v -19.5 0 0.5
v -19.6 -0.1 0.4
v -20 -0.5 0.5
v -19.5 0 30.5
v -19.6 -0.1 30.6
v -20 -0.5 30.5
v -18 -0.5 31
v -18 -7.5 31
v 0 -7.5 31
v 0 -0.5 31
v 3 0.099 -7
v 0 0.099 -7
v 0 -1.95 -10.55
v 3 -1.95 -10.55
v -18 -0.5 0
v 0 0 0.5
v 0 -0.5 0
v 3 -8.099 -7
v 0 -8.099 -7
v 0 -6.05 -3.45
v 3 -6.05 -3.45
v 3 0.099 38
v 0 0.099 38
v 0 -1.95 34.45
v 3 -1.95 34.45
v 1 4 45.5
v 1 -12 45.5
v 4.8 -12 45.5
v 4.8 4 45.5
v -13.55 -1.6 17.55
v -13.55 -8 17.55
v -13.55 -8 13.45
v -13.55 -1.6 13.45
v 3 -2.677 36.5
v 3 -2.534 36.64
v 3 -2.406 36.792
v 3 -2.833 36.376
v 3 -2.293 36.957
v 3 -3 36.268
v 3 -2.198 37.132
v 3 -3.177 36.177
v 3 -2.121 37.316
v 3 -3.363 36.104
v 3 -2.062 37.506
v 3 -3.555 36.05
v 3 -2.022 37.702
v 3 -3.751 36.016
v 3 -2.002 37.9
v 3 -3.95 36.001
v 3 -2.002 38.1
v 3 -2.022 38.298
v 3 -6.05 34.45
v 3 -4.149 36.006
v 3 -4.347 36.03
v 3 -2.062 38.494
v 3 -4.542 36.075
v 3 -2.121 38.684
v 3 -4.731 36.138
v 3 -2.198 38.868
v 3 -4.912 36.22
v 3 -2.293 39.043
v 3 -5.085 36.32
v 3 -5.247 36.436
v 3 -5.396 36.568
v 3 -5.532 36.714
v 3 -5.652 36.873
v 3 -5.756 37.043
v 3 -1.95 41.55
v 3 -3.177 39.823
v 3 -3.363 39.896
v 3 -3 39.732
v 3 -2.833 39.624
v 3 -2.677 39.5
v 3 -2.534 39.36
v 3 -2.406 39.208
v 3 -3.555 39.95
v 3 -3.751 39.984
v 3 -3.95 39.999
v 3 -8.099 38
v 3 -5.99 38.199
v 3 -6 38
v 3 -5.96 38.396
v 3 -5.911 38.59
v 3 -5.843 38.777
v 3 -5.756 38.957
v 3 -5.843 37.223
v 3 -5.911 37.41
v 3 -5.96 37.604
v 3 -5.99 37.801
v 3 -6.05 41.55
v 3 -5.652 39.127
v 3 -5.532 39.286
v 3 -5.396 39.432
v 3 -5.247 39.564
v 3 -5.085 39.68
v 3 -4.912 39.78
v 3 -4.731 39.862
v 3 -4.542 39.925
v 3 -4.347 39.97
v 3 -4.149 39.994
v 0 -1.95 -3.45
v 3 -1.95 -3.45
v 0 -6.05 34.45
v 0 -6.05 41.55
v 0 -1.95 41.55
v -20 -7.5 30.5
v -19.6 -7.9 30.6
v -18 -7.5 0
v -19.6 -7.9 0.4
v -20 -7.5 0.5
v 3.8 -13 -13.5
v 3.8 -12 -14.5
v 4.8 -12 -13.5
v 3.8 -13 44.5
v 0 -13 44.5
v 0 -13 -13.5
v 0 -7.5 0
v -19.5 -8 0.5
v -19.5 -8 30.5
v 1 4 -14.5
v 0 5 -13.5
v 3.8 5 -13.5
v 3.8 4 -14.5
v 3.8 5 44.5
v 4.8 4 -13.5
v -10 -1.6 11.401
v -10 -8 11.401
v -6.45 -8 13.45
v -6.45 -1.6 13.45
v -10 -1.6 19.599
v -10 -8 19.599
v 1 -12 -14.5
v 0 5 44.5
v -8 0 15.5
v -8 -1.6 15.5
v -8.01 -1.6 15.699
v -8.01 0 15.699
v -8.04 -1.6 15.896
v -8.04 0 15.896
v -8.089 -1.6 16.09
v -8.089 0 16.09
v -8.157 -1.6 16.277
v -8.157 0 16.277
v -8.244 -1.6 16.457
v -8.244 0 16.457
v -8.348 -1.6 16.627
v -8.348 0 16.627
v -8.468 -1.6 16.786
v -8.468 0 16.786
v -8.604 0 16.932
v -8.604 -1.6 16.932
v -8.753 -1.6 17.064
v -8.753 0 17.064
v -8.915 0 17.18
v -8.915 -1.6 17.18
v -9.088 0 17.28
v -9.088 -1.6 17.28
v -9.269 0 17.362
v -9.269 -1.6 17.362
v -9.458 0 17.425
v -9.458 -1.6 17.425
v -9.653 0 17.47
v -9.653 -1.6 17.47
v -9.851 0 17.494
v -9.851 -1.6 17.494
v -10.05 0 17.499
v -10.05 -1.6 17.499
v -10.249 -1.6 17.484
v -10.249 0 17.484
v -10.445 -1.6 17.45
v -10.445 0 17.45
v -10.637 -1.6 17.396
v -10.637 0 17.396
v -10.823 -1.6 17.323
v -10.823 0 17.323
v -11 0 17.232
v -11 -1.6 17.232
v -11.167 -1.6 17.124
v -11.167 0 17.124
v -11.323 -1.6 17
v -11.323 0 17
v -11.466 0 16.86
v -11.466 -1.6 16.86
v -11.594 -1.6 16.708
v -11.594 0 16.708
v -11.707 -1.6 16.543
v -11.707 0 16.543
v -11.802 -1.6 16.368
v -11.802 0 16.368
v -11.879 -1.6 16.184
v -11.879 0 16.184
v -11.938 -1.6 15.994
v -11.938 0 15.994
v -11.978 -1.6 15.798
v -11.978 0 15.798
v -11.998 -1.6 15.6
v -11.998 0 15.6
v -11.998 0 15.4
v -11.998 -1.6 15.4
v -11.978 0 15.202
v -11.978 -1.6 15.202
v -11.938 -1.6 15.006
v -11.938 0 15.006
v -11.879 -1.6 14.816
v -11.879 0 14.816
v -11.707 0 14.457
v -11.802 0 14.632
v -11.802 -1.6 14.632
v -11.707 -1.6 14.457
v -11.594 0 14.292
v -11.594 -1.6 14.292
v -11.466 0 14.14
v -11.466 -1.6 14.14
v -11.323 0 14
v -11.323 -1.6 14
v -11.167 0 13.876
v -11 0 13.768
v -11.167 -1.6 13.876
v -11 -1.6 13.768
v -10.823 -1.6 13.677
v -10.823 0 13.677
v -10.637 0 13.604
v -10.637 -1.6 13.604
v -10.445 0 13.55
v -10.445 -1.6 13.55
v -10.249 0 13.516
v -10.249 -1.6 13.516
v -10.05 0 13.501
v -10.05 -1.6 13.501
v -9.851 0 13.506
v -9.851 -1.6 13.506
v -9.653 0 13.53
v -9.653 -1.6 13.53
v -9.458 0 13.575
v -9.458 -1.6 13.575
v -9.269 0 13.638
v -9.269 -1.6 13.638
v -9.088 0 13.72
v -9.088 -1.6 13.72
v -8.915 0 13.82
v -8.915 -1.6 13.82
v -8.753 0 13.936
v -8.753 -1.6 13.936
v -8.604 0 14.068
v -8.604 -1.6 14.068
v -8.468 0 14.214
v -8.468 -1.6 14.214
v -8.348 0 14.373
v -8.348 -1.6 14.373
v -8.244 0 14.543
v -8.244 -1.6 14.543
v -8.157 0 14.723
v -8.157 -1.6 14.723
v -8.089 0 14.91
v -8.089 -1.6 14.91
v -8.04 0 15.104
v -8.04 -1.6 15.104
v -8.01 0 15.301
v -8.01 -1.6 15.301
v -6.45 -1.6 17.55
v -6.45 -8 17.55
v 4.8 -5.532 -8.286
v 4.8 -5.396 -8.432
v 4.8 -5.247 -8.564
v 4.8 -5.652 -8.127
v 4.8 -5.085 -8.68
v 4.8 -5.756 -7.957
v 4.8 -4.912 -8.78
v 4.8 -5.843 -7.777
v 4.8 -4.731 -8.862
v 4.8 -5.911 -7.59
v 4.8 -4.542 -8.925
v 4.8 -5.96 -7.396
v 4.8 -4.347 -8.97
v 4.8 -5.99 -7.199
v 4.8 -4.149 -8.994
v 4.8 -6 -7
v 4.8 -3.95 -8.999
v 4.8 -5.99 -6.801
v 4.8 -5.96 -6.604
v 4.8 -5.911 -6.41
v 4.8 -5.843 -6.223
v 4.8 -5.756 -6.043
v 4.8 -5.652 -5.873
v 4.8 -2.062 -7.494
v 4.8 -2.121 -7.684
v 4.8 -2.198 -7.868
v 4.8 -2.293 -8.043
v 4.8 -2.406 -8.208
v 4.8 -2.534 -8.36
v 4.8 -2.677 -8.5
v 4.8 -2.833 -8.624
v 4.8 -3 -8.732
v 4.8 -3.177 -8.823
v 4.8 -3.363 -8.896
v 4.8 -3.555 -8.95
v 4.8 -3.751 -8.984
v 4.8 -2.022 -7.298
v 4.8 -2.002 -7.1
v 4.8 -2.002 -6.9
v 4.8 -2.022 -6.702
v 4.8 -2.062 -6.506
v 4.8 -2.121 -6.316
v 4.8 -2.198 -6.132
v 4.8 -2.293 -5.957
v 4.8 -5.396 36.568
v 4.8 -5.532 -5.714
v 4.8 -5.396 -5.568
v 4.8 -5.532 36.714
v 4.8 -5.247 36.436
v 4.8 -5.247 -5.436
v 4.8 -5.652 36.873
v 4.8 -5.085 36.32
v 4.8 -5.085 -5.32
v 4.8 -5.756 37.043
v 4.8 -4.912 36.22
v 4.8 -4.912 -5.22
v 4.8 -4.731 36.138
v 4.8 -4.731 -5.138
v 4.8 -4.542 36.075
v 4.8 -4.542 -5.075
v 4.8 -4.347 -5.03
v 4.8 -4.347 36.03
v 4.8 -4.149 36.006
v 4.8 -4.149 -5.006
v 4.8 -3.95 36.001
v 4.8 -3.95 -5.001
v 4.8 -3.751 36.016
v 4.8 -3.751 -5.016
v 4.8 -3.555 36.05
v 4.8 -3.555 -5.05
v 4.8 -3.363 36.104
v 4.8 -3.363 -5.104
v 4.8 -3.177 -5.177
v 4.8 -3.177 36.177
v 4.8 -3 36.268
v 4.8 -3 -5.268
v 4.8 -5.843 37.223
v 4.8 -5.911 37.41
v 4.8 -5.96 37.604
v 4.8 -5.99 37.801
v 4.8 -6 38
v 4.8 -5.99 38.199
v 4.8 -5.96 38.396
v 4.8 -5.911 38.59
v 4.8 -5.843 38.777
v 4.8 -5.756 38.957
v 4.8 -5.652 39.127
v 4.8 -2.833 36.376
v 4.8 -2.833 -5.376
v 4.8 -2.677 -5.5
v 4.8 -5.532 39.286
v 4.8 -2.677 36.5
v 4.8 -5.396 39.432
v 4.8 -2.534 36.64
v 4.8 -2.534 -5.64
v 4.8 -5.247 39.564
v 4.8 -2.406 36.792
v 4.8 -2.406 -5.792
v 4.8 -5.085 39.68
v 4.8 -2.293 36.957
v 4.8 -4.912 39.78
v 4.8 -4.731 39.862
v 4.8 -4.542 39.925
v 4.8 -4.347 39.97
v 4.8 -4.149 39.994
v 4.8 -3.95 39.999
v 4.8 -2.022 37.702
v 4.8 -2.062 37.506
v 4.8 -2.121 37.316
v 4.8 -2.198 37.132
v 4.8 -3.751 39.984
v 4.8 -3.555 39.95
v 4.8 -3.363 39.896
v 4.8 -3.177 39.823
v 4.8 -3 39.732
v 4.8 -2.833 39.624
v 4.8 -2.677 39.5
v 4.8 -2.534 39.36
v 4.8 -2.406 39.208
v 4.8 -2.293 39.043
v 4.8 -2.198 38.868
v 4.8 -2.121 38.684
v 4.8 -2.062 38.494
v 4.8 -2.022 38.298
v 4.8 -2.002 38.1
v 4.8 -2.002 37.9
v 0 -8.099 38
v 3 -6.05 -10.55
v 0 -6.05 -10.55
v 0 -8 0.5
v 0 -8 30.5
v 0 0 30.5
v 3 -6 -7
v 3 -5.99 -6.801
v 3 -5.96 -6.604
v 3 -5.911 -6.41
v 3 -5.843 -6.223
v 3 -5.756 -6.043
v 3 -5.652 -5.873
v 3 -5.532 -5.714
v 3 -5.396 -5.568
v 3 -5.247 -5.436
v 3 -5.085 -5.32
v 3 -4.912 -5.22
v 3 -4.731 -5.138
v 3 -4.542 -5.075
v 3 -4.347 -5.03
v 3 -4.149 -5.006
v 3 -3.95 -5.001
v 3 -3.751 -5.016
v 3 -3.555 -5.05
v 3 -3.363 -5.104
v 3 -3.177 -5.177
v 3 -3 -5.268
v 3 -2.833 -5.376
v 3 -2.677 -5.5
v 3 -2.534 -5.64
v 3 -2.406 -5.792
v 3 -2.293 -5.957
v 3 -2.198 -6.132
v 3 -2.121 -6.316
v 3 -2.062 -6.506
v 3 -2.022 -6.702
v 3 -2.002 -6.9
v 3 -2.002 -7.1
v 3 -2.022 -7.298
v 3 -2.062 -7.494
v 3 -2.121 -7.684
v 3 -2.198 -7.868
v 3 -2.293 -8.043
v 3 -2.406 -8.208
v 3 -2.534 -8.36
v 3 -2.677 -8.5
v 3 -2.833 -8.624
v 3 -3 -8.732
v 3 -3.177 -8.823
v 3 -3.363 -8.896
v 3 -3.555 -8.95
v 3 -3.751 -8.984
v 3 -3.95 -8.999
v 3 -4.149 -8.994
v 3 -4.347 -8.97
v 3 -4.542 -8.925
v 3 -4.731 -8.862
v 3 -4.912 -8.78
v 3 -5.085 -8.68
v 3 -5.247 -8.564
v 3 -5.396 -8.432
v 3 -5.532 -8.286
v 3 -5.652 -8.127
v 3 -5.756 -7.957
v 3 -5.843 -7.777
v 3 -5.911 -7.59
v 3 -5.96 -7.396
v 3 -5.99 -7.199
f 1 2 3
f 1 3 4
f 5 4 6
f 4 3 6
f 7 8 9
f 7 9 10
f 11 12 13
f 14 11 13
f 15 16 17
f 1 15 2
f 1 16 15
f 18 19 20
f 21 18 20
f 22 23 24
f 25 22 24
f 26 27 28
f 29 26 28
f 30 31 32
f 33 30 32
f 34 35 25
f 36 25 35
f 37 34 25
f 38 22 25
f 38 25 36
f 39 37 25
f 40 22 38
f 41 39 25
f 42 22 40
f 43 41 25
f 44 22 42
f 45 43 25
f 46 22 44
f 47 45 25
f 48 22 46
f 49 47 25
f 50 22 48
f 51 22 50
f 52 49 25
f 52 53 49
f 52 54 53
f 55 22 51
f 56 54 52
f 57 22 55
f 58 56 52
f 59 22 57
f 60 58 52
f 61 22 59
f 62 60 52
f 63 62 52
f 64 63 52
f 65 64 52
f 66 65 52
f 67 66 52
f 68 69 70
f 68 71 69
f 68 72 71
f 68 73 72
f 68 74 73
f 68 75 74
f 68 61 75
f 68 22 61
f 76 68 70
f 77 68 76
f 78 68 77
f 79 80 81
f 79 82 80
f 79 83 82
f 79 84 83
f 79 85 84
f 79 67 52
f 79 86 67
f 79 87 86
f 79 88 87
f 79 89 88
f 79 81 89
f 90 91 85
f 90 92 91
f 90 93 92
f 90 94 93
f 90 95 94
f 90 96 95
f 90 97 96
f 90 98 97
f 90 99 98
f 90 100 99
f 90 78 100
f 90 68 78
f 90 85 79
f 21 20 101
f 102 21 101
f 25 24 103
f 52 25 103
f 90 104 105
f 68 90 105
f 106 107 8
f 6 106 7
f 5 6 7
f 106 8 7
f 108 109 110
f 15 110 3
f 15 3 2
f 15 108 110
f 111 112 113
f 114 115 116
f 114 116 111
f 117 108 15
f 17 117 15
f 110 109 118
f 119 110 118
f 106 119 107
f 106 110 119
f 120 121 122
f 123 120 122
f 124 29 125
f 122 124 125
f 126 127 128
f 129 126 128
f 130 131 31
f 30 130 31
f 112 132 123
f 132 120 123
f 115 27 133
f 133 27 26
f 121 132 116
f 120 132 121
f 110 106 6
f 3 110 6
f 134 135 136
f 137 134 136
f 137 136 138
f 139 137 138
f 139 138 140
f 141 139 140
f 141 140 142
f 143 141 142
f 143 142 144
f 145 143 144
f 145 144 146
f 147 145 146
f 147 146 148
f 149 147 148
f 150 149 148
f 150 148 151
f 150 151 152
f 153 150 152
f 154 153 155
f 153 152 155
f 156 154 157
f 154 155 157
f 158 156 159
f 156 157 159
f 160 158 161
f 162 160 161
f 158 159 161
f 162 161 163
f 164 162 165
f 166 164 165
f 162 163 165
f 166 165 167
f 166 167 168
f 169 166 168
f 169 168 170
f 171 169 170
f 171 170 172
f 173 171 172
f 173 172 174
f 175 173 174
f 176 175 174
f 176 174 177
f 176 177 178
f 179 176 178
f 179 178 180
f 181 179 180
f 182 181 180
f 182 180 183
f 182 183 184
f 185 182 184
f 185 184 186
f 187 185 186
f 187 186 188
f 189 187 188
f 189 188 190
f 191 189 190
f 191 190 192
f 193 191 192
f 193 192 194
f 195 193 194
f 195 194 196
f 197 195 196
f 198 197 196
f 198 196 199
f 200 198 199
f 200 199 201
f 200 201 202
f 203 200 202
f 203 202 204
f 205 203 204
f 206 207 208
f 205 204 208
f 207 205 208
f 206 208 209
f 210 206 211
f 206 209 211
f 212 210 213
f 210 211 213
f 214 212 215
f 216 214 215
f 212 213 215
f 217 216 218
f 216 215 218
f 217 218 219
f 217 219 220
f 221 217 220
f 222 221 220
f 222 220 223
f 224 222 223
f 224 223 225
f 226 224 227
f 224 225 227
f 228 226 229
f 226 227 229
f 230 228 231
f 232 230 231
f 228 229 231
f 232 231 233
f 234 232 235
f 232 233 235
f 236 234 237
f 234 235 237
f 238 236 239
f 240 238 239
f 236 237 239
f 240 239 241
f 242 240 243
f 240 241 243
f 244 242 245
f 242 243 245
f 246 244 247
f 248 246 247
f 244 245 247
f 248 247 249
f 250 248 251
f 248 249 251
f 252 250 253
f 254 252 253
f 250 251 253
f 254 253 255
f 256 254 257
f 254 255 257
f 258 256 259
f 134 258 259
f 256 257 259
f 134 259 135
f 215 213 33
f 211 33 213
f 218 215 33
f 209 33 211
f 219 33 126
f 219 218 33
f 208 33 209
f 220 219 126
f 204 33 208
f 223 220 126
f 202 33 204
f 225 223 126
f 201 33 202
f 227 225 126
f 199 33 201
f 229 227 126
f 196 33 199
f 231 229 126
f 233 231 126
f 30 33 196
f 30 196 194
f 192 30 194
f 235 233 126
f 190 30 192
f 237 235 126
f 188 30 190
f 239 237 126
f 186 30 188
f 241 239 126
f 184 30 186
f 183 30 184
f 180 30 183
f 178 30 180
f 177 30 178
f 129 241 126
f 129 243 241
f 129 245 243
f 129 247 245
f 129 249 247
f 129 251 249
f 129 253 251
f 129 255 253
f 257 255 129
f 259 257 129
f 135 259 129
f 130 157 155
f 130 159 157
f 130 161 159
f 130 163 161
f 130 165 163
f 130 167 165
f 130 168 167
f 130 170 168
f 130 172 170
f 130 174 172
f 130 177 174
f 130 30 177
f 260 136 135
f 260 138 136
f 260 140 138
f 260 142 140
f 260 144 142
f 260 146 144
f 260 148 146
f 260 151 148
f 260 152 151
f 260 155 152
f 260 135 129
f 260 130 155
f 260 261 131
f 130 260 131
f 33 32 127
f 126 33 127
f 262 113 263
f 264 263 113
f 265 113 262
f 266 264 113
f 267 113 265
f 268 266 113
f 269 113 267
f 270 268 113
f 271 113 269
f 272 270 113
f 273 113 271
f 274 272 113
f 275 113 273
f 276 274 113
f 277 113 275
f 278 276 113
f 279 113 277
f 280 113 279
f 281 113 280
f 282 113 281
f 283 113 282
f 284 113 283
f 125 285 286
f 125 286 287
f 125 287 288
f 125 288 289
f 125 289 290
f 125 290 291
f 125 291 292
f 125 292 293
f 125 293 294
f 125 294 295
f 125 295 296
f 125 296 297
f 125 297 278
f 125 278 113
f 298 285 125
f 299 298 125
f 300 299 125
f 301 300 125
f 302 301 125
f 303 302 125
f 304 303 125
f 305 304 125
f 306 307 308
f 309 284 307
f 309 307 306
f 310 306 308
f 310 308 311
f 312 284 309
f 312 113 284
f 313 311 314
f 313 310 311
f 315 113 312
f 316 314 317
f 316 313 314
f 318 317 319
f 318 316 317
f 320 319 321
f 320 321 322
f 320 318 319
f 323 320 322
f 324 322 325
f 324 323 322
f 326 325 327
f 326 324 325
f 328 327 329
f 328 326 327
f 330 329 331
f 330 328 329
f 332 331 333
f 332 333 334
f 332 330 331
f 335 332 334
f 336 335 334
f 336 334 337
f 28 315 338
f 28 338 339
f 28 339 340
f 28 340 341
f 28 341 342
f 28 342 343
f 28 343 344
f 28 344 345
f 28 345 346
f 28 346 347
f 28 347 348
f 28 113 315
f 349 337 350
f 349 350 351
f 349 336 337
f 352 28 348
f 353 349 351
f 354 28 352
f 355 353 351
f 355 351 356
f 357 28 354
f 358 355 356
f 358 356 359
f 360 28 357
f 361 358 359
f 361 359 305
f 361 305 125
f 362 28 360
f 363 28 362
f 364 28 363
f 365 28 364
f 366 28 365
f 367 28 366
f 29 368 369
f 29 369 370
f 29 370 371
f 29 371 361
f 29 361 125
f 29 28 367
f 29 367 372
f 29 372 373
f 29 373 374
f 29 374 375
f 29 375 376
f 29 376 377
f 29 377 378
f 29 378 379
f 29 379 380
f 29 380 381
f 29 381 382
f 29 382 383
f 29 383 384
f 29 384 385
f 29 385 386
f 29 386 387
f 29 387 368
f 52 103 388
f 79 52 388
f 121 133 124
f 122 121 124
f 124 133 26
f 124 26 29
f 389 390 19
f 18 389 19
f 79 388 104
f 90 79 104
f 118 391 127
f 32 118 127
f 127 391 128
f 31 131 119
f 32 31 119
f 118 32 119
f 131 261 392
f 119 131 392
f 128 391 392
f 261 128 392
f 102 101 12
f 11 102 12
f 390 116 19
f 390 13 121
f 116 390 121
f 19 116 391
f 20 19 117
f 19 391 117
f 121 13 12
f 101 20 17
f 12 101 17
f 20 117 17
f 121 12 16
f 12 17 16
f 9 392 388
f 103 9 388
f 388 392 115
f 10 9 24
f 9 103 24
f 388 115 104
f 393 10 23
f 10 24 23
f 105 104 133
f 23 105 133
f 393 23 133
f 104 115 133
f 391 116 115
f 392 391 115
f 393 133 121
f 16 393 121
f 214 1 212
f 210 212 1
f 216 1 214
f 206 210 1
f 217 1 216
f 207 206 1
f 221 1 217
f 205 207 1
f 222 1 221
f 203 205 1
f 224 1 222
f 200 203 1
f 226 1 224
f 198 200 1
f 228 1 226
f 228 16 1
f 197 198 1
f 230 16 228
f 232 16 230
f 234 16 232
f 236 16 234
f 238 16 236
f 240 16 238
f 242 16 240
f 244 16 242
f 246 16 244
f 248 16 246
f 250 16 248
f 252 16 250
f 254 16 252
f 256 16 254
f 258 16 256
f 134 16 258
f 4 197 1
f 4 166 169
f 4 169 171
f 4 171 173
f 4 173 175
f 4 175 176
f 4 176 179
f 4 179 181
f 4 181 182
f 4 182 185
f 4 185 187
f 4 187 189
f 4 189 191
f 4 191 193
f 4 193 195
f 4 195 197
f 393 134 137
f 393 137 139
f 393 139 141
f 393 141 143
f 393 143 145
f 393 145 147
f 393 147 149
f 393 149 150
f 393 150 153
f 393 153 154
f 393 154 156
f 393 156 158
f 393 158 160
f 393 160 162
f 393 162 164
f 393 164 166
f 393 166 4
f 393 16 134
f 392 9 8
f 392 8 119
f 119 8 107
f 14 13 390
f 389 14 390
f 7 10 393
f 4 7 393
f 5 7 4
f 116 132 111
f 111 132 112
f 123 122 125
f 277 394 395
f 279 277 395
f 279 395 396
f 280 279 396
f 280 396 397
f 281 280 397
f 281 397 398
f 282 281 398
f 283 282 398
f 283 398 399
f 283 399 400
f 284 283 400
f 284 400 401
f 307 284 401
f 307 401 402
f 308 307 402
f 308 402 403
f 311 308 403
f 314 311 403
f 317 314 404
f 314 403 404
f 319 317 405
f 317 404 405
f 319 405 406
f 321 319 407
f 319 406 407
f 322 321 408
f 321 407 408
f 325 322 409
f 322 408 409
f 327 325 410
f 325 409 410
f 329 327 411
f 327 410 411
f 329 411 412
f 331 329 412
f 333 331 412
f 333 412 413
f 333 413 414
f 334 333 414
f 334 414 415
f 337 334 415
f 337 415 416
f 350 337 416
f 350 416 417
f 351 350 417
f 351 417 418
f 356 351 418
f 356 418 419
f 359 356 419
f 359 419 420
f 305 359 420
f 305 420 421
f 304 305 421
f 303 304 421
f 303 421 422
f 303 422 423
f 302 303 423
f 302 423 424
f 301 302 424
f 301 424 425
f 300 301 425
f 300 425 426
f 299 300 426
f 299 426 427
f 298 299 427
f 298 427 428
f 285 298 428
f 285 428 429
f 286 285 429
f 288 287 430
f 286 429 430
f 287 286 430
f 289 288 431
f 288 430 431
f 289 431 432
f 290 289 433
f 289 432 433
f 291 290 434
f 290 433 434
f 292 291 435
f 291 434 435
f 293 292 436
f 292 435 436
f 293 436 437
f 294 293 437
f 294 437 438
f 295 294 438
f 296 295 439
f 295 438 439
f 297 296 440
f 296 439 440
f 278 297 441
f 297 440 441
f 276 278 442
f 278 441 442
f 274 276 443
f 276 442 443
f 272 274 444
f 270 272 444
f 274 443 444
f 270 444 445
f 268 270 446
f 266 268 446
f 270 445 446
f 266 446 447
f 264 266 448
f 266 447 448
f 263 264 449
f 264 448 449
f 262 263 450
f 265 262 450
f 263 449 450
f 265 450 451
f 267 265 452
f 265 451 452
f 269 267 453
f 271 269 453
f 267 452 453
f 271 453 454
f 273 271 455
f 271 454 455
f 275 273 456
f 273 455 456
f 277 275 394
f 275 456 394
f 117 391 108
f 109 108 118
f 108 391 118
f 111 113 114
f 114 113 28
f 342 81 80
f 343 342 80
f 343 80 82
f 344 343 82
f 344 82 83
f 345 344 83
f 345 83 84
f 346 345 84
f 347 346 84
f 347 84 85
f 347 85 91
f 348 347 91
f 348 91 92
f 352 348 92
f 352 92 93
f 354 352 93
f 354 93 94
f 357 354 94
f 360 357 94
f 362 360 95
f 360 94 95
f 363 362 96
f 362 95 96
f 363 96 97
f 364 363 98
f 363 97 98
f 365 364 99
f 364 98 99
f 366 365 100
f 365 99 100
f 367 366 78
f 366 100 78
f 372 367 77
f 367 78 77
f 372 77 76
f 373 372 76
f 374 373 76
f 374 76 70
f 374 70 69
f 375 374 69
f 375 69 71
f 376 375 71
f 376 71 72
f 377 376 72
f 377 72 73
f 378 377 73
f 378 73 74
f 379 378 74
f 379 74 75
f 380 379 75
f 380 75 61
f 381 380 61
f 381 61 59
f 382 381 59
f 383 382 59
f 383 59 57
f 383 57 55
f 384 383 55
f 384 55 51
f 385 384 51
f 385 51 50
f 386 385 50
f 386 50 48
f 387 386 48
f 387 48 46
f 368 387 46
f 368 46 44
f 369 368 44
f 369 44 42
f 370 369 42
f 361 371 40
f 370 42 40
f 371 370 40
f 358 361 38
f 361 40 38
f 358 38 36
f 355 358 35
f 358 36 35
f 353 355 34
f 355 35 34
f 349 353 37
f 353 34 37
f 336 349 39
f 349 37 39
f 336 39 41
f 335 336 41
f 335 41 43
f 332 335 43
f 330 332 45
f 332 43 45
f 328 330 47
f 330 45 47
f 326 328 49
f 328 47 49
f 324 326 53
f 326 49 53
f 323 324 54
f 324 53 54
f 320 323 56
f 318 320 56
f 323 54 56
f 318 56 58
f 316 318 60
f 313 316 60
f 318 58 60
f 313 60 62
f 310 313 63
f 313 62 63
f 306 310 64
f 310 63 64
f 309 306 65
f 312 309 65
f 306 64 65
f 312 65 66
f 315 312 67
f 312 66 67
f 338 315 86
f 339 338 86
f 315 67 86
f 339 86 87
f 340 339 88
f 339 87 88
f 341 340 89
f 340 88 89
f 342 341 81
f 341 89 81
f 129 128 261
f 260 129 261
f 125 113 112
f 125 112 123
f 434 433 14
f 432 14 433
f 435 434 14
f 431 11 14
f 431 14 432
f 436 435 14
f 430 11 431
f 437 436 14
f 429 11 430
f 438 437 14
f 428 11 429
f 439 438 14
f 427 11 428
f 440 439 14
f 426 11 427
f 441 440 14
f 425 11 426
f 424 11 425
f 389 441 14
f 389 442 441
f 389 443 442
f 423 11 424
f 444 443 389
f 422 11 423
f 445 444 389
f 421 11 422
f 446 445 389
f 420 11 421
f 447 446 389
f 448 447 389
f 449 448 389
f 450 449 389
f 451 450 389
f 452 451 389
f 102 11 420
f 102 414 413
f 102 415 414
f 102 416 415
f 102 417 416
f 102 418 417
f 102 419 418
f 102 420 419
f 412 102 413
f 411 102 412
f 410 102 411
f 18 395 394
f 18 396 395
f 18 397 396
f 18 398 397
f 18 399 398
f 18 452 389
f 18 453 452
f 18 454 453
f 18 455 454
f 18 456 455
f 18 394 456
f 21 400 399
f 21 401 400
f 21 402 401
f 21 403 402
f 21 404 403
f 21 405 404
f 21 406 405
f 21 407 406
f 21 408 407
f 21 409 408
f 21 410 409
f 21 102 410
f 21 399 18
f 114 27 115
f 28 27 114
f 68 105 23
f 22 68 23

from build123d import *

# Parameters (mm, degrees)
F0_W      = 8
F0_H      = 31
F1_DEPTH  = 20
F3_DEPTH  = 6.4
F4_R      = 2
F5_DEPTH  = 1.601
F9_W      = 4.8
F9_H      = 18
F10_DEPTH = 30
F12_DEPTH = 3
F13_R     = 2
F14_DEPTH = 1.801
F15_SIZE  = 0.5
F16_SIZE2 = 2
F16_SIZE  = 0.5
F17_SIZE  = 1


with BuildPart() as f1:
    # F0 (on Right) → F1 (new body)
    with BuildSketch(Plane.YZ):
        with Locations((-4, 15.5)):
            Rectangle(F0_W, F0_H)
    extrude(amount=-F1_DEPTH)

    # F2 (on face) → F3 (cut)
    with BuildSketch(Plane.XZ.offset(8)):
        Polygon((-6.45, 13.4504065444), (-6.45, 17.5495934556), (-10, 19.5991869112), (-13.55, 17.5495934556), (-13.55, 13.4504065444), (-10, 11.4008130888), align=None)
    extrude(amount=-F3_DEPTH, mode=Mode.SUBTRACT)

    # F4 (on face) → F5 (cut, through all)
    with BuildSketch(Plane.XZ.offset(1.6)):
        with Locations((-10, 15.5)):
            Circle(F4_R)
    extrude(amount=-F5_DEPTH, mode=Mode.SUBTRACT)

    # F9 (on 3pt) → F10 (join, symmetric)
    with BuildSketch(Plane.XY.offset(15.5)):
        with Locations((2.4, -4)):
            Rectangle(F9_W, F9_H)
    extrude(amount=F10_DEPTH, both=True)

    # F11 (on face) → F12 (cut)
    with BuildSketch(Plane(origin=(0, 0, 0), x_dir=(0, -1, 0), z_dir=(-1, 0, 0))):
        Polygon((6.0495934556, 41.55), (1.9504065444, 41.55), (-0.0991869112, 38), (1.9504065444, 34.45), (6.0495934556, 34.45), (8.0991869112, 38), align=None)
        Polygon((6.0495934556, -3.45), (1.9504065444, -3.45), (-0.0991869112, -7), (1.9504065444, -10.55), (6.0495934556, -10.55), (8.0991869112, -7), align=None)
    extrude(amount=-F12_DEPTH, mode=Mode.SUBTRACT)

    # F13 (on face) → F14 (cut, through all)
    with BuildSketch(Plane(origin=(3, 0, 0), x_dir=(0, -1, 0), z_dir=(-1, 0, 0))):
        with Locations((4, 38)):
            Circle(F13_R)
        with Locations((4, -7)):
            Circle(F13_R)
    extrude(amount=-F14_DEPTH, mode=Mode.SUBTRACT)

    # F15
    f15_edges = [f1.edges().sort_by_distance(p)[0] for p in [
        (-10, -8, 31),
        (-10, 0, 31),
        (-10, 0, 0),
        (-10, -8, 0),
        (-20, -8, 15.5),
        (-20, 0, 15.5),
    ]]
    chamfer(f15_edges, length=F15_SIZE)

    # F16
    f16_edges = [f1.edges().sort_by_distance(p)[0] for p in [
        (-20, -4, 31),
        (-20, -4, 0),
    ]]
    f16_side = f1.faces().sort_by_distance((-20, -4, 15.5))[0]
    chamfer(f16_edges, length=F16_SIZE, length2=F16_SIZE2, reference=f16_side)

    # F17
    f17_edges = [f1.edges().sort_by_distance(p)[0] for p in [
        (2.4, -13, 45.5),
        (2.4, 5, 45.5),
        (2.4, -13, -14.5),
        (2.4, 5, -14.5),
        (4.8, 5, 15.5),
        (4.8, -4, -14.5),
        (4.8, -13, 15.5),
        (0, -4, 45.5),
        (0, -4, -14.5),
    ]]
    chamfer(f17_edges, length=F17_SIZE)


solid = f1.part
